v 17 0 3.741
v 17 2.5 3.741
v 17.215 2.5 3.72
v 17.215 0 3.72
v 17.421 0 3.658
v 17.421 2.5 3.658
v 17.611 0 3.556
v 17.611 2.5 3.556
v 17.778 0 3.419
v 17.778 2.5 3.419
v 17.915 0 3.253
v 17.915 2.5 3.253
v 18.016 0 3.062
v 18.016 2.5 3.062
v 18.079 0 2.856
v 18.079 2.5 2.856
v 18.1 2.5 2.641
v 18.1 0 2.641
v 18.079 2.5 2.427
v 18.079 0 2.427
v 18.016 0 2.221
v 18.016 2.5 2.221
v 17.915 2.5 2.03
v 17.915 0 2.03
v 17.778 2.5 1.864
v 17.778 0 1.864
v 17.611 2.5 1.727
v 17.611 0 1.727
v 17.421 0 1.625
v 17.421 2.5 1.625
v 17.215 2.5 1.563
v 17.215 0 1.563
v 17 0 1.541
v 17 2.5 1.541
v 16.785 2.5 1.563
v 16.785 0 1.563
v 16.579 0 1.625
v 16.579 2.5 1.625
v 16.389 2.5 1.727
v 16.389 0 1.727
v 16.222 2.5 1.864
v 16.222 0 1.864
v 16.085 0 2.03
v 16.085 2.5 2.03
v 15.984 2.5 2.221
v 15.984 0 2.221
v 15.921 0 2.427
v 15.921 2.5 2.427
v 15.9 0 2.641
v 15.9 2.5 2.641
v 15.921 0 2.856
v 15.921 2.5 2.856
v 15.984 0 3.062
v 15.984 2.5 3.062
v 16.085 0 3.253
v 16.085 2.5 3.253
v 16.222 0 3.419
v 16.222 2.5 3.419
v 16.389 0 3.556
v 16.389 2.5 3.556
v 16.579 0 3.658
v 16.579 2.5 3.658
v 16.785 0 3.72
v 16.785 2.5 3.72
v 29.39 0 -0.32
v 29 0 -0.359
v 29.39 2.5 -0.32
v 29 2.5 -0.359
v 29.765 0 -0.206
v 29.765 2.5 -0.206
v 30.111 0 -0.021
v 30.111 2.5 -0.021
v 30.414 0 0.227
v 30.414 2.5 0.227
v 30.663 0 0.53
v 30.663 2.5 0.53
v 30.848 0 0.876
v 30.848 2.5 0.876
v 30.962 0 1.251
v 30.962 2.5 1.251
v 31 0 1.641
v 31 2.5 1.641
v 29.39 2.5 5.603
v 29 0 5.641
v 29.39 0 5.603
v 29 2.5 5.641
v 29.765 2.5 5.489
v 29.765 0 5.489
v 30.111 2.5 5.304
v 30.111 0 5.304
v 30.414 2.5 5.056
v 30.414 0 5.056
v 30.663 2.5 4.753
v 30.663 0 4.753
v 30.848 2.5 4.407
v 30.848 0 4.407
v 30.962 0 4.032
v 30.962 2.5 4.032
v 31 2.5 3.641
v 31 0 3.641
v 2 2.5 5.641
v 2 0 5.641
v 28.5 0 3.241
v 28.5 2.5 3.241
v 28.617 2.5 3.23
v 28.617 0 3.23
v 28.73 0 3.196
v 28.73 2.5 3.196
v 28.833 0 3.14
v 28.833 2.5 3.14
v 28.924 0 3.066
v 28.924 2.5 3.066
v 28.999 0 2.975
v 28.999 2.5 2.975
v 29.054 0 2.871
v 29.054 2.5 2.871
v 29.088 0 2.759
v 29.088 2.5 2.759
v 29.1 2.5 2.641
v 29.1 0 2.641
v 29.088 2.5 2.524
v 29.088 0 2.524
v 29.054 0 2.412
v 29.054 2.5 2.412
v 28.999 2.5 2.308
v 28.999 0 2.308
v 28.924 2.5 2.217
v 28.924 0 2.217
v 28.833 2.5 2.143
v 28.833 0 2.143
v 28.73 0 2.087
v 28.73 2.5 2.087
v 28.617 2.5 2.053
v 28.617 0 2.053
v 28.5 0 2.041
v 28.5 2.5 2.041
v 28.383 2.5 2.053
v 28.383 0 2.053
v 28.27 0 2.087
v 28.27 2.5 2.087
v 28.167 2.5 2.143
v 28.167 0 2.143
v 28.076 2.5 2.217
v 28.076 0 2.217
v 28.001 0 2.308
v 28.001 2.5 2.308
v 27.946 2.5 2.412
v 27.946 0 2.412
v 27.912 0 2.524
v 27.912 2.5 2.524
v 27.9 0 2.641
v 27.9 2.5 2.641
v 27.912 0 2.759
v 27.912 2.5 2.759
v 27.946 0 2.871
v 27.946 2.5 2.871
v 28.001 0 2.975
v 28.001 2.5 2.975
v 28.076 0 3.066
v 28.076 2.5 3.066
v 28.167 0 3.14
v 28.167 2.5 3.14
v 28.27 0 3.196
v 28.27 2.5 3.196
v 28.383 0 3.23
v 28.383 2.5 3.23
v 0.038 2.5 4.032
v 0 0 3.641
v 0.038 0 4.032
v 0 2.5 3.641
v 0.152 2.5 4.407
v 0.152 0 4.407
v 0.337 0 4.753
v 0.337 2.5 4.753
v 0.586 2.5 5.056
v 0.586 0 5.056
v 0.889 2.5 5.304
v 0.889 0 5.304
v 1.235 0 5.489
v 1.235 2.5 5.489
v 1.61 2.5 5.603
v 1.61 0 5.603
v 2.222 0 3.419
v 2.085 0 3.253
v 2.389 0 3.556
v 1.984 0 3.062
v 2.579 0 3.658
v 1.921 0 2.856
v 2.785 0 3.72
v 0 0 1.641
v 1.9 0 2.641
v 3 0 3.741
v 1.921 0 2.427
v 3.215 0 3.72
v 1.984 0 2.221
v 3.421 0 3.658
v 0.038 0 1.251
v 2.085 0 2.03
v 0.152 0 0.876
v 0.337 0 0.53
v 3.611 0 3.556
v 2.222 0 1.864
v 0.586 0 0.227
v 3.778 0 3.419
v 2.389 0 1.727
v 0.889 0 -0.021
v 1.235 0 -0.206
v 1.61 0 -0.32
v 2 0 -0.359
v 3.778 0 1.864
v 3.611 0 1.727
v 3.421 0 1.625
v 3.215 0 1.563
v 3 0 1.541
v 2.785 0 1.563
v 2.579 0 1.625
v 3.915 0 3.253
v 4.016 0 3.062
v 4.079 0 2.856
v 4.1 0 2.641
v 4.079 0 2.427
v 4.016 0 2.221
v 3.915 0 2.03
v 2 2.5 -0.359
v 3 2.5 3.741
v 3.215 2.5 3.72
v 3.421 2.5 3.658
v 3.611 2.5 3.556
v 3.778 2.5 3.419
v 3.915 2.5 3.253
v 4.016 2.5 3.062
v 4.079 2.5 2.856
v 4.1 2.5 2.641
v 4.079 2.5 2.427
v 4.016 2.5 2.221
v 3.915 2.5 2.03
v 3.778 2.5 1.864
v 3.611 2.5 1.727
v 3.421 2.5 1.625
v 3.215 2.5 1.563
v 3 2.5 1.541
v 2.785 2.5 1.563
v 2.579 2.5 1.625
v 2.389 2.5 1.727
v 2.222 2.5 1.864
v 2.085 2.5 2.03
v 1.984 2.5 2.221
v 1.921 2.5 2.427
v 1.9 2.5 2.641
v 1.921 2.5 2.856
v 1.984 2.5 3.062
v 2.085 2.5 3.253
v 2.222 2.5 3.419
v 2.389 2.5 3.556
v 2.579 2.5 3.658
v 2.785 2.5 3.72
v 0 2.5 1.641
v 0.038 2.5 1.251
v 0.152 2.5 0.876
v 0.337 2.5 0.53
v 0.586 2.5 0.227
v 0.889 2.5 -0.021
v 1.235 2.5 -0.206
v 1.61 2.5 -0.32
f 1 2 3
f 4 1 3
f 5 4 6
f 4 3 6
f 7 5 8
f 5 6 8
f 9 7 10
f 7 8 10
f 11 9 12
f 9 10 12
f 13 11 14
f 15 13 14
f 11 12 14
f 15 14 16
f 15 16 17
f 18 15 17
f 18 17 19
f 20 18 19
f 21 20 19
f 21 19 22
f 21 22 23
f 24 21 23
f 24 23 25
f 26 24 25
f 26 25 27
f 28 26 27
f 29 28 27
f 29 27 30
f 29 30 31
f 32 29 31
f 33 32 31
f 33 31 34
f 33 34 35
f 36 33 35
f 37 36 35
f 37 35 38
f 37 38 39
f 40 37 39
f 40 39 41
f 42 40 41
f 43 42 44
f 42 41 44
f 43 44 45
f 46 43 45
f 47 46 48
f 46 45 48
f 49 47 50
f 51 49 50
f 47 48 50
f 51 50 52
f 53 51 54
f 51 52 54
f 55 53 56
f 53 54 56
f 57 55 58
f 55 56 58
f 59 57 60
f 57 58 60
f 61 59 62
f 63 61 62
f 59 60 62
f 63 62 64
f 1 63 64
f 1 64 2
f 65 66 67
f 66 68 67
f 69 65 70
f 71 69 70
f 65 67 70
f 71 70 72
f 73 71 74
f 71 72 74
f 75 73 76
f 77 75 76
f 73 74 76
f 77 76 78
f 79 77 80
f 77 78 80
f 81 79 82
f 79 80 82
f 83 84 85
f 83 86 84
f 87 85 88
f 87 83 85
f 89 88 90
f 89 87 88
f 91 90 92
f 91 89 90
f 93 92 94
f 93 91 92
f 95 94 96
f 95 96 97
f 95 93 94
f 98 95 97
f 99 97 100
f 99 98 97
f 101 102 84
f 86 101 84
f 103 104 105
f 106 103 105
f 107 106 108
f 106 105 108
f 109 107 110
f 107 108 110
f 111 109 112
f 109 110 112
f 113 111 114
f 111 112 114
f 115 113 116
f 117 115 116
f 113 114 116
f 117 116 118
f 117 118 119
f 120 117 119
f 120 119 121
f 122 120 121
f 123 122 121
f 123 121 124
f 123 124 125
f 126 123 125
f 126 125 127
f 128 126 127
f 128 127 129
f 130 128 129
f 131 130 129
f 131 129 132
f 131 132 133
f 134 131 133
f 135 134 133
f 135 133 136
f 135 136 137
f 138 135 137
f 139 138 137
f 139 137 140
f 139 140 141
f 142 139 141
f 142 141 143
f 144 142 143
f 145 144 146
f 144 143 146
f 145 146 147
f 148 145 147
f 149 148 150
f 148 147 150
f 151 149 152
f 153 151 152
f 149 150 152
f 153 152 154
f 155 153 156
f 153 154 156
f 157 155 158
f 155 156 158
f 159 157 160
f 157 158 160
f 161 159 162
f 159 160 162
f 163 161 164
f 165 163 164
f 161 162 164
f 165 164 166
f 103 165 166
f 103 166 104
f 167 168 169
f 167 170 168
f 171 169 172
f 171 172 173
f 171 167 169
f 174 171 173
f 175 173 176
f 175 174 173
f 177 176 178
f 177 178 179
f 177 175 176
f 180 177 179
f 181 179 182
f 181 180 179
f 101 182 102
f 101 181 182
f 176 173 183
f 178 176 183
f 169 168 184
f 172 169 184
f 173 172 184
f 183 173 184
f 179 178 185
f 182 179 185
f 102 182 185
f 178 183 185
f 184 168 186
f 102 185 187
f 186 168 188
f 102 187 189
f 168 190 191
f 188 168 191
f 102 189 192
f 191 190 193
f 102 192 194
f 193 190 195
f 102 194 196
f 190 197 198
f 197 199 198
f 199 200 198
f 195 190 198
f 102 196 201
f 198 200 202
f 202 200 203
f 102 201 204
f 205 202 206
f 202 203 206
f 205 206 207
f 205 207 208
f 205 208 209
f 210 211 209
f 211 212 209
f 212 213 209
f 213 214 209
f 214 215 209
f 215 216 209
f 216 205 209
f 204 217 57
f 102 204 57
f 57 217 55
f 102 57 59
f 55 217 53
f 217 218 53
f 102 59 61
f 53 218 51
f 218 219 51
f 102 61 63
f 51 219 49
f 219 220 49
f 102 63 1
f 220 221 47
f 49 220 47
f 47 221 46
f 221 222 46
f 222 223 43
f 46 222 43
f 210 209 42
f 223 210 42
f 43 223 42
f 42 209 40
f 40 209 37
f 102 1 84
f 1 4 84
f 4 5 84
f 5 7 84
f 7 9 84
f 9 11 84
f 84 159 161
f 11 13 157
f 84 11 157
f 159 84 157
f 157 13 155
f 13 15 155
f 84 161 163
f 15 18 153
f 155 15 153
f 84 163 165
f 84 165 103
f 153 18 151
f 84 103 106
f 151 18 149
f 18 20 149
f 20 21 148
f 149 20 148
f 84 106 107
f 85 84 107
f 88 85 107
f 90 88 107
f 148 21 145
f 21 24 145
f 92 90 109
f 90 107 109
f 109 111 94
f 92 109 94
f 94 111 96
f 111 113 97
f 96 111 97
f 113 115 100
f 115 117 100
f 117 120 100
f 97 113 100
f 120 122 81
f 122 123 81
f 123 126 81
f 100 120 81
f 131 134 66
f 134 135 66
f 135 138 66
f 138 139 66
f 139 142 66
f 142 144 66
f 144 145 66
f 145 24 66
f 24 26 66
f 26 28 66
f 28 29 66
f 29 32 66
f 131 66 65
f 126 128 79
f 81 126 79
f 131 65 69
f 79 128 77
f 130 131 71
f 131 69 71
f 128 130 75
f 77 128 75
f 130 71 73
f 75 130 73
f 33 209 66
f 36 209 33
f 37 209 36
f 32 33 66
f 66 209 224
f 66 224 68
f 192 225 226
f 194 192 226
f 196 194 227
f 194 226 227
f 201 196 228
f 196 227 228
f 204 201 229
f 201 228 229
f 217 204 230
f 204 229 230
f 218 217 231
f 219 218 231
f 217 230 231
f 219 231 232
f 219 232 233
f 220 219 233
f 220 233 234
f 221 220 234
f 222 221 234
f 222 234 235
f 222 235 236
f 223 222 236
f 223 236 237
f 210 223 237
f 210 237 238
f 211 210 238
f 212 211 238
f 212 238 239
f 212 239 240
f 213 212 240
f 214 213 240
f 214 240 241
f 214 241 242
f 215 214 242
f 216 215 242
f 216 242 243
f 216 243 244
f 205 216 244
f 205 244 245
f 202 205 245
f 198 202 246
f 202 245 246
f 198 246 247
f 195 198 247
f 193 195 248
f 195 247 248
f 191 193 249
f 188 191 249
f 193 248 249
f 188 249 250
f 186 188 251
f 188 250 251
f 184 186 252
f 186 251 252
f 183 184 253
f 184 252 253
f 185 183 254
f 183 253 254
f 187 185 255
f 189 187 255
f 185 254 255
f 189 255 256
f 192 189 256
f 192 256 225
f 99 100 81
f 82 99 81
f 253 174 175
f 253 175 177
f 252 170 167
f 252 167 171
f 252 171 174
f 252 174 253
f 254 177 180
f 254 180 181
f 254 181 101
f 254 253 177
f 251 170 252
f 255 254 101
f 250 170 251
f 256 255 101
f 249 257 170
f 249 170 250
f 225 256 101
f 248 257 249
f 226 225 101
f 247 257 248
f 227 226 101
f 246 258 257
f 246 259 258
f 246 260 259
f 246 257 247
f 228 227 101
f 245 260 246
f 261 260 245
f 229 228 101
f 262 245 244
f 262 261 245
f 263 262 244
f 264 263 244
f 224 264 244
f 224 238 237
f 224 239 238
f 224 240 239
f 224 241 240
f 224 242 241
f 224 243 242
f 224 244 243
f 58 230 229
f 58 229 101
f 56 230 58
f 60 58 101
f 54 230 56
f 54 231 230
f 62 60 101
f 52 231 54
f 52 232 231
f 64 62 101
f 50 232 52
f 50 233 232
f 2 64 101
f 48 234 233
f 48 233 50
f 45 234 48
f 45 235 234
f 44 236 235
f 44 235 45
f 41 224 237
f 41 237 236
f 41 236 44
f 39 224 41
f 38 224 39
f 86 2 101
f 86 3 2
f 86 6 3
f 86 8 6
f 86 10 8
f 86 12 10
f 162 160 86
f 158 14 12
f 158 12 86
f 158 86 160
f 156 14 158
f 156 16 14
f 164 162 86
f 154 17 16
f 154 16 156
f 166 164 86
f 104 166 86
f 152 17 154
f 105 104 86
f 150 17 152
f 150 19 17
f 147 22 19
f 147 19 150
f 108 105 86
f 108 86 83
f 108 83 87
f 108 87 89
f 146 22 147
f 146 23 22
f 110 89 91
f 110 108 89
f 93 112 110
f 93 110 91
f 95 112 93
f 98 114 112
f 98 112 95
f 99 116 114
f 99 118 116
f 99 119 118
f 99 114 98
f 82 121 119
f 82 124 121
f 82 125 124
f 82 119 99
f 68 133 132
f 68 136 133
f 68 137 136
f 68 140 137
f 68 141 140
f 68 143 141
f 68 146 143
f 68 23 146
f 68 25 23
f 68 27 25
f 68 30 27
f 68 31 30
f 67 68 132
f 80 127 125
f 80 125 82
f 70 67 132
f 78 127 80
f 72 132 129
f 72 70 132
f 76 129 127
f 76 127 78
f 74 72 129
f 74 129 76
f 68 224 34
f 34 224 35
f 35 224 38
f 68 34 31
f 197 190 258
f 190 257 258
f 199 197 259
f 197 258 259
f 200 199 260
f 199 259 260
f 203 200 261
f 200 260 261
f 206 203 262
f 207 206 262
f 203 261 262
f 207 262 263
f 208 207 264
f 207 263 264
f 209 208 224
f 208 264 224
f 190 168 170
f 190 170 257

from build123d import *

# Parameters (mm, degrees)
SKETCH_1_W          = 31
SKETCH_1_H          = 6
EXTRUDE_1_DEPTH     = 2.5
SKETCH_2_R          = 1.1
CUT_EXTRUDE_1_DEPTH = 32.608171111
SKETCH_3_R          = 0.6
CUT_EXTRUDE_2_DEPTH = 32.608171111
FILLET_1_R          = 2


with BuildPart() as part:
    # 草图1 → 凸台-拉伸1 (new body)
    with BuildSketch(Plane(origin=(0, 0, 0), x_dir=(1, 0, 0), z_dir=(0, 1, 0))):
        with Locations((15.5, -2.64149634)):
            Rectangle(SKETCH_1_W, SKETCH_1_H)
    extrude(amount=EXTRUDE_1_DEPTH)

    # 草图2 → 切除-拉伸1 (cut, through all)
    with BuildSketch(Plane(origin=(0, 2.5, 0), x_dir=(1, 0, 0), z_dir=(0, 1, 0))):
        with Locations(Location((3, -2.64149634, 0), (0, 0, 270))):
            Circle(SKETCH_2_R)
        with Locations(Location((17, -2.64149634, 0), (0, 0, 270))):
            Circle(SKETCH_2_R)
    extrude(amount=-CUT_EXTRUDE_1_DEPTH, mode=Mode.SUBTRACT)

    # 草图3 → 切除-拉伸2 (cut, through all)
    with BuildSketch(Plane(origin=(0, 2.5, 0), x_dir=(1, 0, 0), z_dir=(0, 1, 0))):
        with Locations(Location((28.5, -2.64149634, 0), (0, 0, 270))):
            Circle(SKETCH_3_R)
    extrude(amount=-CUT_EXTRUDE_2_DEPTH, mode=Mode.SUBTRACT)

    # 圆角1
    fillet_1_edges = [part.edges().sort_by_distance(p)[0] for p in [
        (0, 1.25, -0.35850366),
        (31, 1.25, -0.35850366),
        (31, 1.25, 5.64149634),
        (0, 1.25, 5.64149634),
    ]]
    fillet(fillet_1_edges, radius=FILLET_1_R)


solid = part.part
